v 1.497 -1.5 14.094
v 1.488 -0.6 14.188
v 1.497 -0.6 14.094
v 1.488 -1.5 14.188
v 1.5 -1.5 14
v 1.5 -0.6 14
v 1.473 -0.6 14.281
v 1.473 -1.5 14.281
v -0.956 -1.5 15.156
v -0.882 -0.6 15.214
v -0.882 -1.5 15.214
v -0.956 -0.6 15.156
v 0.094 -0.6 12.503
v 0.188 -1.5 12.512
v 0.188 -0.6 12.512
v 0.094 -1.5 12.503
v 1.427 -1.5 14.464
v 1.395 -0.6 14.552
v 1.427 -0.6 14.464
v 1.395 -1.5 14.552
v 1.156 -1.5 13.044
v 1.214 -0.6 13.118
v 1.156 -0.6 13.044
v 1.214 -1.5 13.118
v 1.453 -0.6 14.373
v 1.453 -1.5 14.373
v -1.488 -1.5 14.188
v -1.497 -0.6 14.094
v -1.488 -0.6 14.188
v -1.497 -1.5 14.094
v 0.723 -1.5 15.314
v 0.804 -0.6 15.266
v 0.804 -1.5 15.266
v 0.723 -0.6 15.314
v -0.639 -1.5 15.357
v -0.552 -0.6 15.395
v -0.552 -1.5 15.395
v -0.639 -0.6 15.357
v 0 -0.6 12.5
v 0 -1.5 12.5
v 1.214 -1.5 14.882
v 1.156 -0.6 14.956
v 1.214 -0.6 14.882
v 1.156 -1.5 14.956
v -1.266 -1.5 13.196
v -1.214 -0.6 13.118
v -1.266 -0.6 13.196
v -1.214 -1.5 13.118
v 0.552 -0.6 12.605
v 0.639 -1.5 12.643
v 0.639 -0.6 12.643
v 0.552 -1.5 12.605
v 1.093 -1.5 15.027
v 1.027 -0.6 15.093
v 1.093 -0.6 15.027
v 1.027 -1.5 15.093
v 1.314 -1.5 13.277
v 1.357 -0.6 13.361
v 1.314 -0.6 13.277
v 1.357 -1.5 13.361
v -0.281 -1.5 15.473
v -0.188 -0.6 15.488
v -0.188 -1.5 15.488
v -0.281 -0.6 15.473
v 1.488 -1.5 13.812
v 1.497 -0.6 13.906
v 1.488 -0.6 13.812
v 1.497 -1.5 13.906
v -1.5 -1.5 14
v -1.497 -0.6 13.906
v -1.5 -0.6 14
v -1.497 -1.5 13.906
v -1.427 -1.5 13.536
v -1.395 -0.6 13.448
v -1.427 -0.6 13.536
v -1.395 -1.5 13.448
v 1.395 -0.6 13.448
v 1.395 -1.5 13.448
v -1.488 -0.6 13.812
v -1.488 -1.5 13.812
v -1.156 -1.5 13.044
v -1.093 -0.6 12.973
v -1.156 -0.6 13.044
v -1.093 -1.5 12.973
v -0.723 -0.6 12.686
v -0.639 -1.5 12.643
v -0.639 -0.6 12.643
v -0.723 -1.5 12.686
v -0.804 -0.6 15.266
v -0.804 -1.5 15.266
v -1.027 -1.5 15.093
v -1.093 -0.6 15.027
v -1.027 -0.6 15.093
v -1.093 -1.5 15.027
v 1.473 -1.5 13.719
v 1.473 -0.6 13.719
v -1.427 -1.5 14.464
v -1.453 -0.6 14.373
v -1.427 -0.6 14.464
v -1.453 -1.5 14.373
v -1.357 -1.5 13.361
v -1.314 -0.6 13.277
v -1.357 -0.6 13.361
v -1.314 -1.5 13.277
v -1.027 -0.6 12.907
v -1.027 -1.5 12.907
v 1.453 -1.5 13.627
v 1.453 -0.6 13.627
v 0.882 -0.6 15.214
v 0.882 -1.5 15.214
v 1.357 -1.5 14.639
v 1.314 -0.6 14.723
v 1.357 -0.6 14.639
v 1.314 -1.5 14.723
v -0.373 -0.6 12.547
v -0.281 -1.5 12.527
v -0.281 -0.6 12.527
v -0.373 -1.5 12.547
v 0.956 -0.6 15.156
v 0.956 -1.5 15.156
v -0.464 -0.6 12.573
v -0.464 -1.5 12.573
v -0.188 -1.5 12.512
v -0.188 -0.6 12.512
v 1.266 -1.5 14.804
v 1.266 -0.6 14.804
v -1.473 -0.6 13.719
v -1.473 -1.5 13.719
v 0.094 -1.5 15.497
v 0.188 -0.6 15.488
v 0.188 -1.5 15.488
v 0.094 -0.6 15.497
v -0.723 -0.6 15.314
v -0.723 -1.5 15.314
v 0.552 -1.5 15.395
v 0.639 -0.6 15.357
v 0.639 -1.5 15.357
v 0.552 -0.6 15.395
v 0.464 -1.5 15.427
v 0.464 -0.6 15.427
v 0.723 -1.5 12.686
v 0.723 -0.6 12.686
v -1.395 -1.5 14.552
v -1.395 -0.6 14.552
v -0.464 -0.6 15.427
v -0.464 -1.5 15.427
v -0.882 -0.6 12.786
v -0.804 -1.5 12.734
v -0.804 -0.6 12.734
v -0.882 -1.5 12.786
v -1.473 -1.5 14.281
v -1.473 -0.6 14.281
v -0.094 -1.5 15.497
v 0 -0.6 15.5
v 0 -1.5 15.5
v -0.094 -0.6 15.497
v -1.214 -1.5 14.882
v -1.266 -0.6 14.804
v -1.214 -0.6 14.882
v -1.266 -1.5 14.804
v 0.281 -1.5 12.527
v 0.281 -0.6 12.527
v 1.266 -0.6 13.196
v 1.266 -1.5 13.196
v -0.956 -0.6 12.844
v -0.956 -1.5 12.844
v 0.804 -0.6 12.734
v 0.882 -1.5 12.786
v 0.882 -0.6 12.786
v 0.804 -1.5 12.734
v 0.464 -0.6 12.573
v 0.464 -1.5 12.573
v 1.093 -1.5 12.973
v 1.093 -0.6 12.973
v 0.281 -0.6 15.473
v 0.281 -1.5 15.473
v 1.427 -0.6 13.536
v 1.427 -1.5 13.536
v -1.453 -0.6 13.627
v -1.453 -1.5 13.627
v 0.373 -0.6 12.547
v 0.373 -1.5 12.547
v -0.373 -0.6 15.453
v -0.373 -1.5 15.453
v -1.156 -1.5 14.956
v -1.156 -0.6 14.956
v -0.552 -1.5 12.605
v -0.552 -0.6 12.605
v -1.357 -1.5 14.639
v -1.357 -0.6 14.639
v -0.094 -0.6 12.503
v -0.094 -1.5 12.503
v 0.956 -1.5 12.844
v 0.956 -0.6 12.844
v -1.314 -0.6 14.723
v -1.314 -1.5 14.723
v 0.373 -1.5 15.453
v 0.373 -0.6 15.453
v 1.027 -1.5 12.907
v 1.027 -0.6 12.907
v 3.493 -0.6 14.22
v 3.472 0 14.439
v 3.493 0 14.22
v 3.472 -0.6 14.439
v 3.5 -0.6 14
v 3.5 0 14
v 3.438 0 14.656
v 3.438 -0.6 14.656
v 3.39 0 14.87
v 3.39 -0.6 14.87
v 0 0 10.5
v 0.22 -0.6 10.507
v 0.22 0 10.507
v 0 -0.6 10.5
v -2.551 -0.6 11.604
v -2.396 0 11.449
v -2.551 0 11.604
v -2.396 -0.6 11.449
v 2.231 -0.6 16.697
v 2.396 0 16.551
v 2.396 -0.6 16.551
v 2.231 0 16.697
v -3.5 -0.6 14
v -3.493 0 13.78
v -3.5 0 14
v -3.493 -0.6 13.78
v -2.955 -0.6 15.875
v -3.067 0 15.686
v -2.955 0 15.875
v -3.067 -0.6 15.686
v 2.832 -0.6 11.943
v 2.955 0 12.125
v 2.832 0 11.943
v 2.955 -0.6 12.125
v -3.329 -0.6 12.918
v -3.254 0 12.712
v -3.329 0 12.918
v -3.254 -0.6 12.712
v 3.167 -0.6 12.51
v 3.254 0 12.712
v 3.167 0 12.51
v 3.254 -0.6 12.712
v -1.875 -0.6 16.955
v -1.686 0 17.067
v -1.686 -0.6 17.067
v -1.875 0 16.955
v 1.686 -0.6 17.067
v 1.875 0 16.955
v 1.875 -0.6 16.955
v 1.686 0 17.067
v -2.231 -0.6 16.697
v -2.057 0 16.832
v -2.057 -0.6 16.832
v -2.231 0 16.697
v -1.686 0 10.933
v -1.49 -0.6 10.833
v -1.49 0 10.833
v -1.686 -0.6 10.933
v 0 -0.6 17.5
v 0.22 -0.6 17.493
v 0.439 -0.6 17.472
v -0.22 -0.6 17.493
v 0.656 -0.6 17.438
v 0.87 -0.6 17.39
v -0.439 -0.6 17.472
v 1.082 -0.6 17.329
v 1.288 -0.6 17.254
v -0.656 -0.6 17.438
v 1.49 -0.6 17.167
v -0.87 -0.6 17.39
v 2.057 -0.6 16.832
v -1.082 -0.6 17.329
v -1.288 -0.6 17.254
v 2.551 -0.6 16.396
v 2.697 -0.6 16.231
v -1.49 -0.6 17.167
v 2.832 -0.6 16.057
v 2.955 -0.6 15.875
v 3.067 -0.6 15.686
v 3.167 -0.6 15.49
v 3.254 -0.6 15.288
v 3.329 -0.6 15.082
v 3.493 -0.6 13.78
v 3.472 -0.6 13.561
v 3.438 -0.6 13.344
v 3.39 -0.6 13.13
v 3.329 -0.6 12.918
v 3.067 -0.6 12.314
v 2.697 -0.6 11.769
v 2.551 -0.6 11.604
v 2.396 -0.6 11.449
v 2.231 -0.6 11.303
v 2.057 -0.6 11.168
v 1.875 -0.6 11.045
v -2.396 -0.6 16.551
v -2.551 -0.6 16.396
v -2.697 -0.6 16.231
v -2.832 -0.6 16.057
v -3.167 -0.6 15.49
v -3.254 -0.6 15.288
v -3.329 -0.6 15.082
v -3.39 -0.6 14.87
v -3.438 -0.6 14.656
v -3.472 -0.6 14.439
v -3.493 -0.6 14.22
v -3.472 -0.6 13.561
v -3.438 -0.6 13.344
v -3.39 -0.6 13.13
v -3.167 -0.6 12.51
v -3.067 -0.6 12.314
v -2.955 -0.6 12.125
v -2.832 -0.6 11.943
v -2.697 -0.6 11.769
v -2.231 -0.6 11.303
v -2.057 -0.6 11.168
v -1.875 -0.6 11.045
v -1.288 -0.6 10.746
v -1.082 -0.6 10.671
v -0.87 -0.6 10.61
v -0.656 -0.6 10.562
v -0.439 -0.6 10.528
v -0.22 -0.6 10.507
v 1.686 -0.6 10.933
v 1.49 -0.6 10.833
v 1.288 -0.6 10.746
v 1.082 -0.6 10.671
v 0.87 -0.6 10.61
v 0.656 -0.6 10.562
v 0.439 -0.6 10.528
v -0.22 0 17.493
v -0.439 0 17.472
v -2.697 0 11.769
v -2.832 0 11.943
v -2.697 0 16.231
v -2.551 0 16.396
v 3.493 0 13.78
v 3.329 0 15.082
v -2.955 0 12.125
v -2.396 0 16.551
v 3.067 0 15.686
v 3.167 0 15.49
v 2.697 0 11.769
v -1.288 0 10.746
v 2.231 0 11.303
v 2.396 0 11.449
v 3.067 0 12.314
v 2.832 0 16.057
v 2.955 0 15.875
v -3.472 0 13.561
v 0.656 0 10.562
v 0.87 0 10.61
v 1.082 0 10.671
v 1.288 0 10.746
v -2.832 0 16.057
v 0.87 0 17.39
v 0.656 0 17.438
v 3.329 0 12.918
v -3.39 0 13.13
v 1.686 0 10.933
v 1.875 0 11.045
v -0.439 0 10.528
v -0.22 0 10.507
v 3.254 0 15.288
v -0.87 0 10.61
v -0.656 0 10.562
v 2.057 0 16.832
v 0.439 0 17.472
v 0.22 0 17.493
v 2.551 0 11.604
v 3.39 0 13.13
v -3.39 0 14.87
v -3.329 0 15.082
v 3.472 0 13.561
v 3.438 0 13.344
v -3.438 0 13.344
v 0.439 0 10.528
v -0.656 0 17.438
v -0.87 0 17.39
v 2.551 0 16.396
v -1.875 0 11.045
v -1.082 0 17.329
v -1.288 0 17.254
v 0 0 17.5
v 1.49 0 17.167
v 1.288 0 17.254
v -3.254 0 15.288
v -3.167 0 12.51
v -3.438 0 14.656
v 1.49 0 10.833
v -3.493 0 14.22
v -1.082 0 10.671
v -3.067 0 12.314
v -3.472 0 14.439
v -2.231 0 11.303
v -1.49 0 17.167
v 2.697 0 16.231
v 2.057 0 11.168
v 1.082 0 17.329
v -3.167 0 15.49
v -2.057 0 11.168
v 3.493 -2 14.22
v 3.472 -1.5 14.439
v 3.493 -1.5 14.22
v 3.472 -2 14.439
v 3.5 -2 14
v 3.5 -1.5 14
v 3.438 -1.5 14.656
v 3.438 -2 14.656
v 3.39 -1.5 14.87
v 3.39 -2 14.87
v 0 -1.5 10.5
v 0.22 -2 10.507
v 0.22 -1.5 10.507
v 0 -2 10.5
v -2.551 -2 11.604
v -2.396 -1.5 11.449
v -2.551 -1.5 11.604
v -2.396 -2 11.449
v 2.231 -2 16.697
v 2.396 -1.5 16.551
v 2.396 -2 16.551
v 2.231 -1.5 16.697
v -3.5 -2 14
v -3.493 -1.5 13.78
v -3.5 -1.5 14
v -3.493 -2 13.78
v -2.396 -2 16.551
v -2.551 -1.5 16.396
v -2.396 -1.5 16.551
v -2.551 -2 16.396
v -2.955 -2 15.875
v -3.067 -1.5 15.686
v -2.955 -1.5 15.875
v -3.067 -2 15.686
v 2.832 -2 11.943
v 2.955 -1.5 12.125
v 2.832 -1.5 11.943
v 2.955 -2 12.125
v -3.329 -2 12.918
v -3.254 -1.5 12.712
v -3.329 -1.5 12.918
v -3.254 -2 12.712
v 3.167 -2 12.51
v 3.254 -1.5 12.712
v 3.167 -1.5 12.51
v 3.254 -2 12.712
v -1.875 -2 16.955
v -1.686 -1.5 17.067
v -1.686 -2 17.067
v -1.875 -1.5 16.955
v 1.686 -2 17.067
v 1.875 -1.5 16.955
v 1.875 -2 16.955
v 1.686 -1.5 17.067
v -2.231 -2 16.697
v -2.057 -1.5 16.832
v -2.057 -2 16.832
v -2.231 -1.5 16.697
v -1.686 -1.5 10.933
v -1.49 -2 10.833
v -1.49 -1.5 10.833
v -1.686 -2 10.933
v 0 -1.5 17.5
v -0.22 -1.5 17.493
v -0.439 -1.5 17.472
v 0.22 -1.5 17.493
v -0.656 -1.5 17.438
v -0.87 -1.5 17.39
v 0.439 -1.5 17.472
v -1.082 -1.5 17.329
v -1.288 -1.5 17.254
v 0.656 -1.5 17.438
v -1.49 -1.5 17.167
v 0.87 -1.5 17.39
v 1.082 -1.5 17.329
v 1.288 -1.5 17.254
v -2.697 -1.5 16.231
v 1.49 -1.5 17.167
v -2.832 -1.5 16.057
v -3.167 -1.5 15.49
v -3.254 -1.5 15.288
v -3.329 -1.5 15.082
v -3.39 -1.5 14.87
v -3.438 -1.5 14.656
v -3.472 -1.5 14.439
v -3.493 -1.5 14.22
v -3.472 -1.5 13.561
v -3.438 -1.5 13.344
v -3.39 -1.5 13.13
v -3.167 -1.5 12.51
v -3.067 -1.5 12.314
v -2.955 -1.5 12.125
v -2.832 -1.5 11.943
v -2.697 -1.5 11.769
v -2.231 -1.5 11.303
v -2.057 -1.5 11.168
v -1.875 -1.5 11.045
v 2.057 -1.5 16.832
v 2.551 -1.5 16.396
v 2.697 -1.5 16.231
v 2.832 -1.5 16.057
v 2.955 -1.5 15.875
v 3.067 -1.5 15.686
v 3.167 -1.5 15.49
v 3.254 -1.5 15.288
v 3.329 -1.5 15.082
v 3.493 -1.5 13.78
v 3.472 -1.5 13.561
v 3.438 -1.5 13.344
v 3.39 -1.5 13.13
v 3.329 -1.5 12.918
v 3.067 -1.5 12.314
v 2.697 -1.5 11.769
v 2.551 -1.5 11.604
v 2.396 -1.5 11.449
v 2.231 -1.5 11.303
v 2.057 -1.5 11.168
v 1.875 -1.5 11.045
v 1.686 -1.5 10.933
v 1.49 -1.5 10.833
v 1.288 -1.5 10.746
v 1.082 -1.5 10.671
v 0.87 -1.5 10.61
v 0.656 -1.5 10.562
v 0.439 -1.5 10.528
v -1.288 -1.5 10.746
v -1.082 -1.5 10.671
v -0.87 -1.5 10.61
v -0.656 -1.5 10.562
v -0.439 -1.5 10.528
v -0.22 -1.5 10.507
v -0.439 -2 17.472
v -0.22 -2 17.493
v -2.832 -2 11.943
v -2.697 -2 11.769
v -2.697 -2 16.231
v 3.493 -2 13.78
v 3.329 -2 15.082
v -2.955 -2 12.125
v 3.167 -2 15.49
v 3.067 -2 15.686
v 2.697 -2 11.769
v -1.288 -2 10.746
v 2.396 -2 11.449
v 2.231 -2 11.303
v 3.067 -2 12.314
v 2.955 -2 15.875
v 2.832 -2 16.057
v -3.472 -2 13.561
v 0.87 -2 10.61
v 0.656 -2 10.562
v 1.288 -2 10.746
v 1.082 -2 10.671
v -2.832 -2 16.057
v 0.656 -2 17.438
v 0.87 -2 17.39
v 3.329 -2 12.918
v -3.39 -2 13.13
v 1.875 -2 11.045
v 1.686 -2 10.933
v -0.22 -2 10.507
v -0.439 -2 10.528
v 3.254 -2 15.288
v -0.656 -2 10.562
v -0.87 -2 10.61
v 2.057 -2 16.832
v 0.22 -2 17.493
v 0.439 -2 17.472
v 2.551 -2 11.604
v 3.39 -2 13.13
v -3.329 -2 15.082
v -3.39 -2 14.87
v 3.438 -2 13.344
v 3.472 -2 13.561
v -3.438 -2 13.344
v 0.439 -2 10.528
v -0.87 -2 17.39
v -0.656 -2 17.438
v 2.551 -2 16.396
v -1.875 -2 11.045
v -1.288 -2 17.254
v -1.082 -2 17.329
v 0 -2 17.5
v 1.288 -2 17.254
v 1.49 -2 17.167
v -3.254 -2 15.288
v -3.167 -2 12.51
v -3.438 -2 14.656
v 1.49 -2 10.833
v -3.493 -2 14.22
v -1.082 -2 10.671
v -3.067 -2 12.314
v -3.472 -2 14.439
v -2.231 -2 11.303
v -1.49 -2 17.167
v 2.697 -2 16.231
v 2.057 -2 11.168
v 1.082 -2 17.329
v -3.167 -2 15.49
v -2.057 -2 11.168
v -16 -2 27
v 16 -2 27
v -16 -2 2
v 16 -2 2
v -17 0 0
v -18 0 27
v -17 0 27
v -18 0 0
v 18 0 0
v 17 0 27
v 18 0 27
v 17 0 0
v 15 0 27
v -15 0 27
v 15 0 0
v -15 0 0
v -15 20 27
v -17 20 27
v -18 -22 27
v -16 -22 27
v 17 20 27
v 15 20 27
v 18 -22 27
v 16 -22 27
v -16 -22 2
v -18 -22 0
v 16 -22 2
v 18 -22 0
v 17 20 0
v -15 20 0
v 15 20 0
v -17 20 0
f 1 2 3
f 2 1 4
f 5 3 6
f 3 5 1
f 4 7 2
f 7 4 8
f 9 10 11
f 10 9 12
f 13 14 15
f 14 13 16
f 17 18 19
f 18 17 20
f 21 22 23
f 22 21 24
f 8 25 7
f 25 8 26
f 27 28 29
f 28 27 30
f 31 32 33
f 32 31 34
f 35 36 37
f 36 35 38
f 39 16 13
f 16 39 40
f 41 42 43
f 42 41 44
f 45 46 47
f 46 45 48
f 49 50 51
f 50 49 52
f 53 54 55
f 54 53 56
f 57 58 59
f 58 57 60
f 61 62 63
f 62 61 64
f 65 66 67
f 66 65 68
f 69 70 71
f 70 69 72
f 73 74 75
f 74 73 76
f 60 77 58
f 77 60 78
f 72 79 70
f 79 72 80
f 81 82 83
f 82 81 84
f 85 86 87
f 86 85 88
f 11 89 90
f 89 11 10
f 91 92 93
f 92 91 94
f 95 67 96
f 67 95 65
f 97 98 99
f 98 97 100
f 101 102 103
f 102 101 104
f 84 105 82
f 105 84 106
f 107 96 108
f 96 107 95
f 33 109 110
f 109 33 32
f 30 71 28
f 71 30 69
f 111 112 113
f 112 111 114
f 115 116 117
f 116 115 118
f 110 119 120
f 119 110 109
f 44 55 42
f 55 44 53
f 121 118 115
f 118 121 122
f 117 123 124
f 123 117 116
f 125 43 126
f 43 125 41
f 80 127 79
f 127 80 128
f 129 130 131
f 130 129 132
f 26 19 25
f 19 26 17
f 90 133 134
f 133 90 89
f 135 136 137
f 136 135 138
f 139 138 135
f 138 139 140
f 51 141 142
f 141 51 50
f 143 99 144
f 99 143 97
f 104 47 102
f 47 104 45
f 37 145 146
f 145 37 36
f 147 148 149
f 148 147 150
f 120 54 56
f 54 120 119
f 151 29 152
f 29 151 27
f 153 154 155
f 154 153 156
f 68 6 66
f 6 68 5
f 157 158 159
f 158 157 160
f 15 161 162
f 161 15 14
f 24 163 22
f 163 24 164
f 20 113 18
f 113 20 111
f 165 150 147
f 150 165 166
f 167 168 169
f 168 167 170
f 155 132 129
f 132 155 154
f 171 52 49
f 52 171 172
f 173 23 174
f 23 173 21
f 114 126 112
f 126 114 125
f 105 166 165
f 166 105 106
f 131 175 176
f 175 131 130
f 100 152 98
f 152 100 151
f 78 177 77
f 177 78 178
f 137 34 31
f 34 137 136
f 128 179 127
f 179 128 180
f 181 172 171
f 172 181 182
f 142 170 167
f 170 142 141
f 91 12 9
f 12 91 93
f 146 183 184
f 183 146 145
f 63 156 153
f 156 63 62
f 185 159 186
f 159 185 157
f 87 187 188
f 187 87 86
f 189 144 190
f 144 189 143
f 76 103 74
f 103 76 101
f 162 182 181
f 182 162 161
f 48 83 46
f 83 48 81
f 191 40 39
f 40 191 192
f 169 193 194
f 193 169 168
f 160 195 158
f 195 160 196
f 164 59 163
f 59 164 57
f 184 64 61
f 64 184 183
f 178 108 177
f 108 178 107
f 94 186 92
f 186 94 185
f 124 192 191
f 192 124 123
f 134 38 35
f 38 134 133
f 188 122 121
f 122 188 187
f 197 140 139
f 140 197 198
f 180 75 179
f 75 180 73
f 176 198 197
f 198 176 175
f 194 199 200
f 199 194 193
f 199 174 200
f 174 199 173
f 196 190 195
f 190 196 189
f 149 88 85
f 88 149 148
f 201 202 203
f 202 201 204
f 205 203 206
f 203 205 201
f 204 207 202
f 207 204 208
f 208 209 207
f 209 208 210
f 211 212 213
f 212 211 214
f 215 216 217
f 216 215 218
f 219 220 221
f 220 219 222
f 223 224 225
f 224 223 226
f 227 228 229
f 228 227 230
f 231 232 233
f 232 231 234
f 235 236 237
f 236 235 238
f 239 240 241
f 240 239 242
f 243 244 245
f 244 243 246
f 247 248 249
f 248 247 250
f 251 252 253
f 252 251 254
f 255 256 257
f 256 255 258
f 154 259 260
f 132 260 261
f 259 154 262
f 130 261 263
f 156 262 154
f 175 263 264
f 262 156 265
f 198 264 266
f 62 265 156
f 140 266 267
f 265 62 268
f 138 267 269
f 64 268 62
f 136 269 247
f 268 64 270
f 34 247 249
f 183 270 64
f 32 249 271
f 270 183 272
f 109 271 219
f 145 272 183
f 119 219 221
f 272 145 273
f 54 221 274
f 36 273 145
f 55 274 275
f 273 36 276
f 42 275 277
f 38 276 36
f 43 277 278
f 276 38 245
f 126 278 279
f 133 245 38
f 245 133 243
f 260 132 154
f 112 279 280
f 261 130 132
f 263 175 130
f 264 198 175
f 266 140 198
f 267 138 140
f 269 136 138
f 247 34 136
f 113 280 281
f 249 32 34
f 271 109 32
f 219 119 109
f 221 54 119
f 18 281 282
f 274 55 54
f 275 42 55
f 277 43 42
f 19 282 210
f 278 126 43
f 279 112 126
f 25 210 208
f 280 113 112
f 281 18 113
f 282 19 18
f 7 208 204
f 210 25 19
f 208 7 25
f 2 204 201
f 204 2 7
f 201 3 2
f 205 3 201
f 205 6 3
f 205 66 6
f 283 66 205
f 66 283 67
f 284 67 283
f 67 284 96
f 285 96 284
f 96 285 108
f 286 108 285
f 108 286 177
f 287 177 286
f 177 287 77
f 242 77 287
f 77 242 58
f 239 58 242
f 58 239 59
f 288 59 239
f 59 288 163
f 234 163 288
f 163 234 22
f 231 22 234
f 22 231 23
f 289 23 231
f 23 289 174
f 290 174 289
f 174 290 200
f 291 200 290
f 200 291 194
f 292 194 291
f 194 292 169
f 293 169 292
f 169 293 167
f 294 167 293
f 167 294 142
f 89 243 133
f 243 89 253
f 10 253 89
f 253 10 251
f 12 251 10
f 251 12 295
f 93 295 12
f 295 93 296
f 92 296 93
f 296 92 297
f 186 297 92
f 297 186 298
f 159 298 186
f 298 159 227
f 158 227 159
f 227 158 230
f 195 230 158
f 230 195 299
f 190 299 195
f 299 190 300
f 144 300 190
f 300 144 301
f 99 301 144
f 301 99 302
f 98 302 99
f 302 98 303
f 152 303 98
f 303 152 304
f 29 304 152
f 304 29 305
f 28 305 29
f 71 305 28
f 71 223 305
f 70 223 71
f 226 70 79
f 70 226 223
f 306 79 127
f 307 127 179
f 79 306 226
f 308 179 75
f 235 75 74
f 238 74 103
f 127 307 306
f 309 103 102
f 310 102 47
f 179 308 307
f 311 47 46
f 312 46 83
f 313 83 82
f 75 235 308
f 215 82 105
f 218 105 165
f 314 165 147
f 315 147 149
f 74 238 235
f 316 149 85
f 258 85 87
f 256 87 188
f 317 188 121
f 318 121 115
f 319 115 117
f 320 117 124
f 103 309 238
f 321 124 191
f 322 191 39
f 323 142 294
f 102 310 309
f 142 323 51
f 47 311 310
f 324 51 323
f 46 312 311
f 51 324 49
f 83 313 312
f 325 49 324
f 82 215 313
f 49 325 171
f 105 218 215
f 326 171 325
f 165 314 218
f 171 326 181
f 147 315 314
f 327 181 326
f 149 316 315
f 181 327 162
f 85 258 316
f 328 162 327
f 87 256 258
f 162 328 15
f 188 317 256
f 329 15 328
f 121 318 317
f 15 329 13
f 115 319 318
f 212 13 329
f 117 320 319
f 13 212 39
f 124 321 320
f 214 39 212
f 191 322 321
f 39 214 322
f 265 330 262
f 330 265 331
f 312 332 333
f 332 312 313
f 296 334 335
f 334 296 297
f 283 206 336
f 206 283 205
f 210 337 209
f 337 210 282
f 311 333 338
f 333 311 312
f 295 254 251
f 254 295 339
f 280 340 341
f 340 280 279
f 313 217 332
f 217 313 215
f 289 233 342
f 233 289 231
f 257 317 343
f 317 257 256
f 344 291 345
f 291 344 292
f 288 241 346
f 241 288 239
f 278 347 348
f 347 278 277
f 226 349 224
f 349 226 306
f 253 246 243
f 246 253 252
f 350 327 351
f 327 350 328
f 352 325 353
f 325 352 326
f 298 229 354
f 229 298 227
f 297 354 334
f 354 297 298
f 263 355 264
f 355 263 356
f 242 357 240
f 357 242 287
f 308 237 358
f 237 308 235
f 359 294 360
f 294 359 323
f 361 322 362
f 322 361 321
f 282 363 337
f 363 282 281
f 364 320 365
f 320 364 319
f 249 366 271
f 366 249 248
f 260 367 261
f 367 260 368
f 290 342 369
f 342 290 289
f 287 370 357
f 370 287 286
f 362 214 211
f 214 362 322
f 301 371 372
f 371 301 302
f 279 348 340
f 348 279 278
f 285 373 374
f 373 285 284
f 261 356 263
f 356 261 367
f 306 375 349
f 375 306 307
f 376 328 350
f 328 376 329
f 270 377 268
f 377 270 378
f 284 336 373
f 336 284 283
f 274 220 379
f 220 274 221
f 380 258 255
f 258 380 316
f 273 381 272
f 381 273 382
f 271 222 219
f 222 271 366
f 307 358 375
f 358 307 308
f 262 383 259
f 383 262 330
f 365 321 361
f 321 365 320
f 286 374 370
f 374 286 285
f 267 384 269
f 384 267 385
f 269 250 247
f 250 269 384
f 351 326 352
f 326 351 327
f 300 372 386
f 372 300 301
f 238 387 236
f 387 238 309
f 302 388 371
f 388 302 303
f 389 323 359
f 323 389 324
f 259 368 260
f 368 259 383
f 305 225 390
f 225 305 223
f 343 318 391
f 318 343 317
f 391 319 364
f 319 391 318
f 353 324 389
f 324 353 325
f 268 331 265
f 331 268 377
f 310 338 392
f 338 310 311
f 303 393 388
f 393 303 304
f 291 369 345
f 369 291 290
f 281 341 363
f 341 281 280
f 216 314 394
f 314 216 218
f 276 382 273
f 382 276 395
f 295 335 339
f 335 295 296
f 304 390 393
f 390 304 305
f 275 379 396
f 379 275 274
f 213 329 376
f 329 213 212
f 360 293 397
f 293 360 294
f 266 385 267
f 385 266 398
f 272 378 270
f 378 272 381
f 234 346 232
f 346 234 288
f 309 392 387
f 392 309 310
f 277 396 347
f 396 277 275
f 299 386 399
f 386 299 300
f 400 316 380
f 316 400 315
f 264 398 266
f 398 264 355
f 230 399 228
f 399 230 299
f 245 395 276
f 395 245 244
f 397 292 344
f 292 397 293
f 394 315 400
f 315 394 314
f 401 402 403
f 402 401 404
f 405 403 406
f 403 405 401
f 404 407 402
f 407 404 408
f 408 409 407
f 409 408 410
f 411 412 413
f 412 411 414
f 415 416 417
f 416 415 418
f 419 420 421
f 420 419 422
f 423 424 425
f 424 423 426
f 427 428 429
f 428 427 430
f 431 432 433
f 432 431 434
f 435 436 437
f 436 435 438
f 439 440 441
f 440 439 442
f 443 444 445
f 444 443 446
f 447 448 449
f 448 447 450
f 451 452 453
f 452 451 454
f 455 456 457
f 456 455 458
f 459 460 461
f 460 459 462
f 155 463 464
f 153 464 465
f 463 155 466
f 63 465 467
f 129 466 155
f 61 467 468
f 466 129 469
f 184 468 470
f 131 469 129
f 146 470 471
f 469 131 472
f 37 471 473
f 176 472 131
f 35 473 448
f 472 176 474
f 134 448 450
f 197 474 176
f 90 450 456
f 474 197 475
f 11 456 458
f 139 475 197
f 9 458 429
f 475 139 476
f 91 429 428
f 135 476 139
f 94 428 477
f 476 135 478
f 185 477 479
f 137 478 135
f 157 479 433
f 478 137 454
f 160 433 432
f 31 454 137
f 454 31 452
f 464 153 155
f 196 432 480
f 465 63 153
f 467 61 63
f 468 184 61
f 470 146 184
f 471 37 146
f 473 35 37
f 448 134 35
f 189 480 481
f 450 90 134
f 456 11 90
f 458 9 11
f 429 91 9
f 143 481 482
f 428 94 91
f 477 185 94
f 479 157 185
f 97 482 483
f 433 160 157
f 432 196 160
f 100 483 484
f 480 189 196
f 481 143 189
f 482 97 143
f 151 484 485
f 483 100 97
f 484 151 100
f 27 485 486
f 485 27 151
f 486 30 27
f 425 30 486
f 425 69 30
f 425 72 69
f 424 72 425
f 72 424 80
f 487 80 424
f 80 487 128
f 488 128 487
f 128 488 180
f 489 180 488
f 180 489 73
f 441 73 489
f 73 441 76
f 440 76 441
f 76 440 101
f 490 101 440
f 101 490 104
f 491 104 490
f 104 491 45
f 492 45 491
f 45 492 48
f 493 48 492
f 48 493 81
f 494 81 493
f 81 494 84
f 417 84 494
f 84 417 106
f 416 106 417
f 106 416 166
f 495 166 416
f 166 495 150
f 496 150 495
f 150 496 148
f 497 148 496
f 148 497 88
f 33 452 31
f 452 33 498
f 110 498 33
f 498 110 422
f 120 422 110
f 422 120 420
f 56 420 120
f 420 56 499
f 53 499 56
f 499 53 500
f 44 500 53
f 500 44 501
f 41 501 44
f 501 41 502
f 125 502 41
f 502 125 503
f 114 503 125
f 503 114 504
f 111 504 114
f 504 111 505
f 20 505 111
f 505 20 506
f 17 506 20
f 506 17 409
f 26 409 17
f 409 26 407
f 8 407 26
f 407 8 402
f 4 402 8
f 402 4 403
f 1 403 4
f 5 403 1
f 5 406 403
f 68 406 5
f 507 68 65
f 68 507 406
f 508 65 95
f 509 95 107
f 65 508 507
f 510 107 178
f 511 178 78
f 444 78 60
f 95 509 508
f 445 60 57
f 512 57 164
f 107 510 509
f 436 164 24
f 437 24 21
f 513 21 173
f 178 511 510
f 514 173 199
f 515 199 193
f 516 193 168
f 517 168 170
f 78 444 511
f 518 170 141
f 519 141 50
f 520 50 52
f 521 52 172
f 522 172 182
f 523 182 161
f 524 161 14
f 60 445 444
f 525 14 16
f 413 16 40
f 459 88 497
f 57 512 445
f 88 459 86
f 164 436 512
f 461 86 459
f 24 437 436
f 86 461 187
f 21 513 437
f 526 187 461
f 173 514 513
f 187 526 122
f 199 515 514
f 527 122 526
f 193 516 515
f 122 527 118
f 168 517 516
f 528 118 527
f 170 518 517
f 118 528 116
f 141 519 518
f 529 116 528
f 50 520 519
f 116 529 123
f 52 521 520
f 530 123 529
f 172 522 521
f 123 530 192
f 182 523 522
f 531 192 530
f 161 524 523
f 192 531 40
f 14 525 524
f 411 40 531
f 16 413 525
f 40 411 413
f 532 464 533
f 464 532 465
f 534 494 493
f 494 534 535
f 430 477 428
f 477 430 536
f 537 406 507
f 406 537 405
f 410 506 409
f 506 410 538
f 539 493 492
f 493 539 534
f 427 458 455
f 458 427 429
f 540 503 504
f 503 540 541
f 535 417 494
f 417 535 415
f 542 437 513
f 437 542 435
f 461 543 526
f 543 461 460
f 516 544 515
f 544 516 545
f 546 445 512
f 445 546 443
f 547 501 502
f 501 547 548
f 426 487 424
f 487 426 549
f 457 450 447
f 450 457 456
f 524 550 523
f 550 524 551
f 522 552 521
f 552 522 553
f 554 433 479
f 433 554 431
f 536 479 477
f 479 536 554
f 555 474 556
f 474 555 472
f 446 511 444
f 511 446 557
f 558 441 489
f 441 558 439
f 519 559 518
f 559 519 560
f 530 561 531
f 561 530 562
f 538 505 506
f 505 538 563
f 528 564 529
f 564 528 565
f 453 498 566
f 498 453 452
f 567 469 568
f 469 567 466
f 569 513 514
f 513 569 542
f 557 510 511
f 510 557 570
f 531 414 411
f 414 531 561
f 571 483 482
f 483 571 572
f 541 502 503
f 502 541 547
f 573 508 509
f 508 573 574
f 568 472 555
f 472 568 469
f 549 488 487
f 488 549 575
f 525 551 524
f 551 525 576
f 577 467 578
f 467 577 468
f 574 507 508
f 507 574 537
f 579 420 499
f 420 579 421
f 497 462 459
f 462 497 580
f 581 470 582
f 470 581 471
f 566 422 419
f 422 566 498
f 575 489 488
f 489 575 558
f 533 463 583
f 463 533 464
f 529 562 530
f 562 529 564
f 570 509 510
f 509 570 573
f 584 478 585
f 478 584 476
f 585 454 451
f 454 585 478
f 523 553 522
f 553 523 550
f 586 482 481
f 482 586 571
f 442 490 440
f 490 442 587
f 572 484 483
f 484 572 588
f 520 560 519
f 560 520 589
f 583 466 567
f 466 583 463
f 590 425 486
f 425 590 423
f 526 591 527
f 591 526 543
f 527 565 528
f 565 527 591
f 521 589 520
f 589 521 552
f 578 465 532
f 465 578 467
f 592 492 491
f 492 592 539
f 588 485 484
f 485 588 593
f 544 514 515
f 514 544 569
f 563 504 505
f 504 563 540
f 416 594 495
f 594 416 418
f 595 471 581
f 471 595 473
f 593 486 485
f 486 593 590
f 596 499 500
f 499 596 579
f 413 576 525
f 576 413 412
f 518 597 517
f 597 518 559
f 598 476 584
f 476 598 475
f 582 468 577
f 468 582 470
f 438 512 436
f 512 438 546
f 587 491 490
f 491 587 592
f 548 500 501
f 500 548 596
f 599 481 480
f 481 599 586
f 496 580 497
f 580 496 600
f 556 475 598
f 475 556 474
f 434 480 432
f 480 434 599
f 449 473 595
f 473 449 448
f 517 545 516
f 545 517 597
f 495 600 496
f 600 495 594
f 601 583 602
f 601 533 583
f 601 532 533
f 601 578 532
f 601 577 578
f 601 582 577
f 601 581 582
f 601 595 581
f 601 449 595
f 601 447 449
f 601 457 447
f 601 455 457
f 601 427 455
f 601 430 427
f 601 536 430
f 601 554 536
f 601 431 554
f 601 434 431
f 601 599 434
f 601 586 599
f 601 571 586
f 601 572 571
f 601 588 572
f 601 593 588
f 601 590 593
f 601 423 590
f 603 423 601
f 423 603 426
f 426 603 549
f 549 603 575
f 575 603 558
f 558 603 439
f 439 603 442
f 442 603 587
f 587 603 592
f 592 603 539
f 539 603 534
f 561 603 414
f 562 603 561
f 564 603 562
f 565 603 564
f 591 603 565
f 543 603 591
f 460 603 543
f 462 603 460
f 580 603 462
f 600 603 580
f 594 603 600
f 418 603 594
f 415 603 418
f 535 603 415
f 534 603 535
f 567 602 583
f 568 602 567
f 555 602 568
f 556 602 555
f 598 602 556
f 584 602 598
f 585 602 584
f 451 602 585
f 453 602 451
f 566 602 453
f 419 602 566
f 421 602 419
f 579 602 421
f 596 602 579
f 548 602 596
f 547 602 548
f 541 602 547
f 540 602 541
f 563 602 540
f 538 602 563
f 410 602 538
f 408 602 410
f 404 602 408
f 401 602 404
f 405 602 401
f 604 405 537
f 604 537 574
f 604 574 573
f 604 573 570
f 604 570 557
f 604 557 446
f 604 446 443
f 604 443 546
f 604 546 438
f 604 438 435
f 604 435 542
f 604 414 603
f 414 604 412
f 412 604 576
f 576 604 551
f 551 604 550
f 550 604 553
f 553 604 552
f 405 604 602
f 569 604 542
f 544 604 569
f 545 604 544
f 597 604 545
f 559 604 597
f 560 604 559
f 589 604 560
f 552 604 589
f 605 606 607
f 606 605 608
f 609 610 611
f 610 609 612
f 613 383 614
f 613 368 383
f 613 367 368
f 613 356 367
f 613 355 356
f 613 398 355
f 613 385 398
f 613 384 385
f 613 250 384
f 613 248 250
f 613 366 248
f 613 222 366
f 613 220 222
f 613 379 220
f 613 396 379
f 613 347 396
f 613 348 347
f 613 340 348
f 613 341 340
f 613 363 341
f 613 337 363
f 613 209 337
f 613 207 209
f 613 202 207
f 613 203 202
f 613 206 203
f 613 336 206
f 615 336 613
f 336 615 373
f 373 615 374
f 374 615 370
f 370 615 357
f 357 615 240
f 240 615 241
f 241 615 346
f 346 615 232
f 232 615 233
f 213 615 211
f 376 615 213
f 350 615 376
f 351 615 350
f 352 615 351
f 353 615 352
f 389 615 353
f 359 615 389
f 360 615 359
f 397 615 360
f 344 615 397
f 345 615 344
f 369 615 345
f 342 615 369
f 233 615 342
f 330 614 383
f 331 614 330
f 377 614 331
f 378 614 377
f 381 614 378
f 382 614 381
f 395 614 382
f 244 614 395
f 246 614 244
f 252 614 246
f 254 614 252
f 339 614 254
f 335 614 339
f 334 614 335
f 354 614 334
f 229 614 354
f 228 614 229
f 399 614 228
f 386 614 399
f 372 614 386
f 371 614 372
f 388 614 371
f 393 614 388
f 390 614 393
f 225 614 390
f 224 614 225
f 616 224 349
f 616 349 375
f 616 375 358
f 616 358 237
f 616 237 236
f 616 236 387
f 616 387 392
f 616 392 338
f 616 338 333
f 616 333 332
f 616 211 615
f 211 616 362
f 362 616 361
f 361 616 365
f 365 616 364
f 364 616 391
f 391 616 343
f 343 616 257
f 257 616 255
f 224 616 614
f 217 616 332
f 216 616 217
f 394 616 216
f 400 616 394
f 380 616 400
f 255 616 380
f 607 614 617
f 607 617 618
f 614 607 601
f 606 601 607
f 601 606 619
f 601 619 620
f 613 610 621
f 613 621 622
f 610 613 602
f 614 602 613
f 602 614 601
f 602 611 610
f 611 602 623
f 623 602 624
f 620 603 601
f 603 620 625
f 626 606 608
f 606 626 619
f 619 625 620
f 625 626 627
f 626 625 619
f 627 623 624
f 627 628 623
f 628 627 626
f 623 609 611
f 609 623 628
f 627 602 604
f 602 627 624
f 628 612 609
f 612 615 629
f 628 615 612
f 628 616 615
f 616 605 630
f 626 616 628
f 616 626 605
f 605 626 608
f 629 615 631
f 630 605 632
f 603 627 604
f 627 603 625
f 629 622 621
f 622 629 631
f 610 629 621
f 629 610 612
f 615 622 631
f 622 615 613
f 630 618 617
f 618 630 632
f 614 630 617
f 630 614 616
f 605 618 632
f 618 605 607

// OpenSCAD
// file: common.scad
// This work is licensed under a Creative Commons Attribution-ShareAlike 4.0 International License (http://creativecommons.org/licenses/by-sa/4.0/)

module xmove(dist) { translate([dist, 0, 0]) children(); }
module ymove(dist) { translate([0, dist, 0]) children(); }
module zmove(dist) { translate([0, 0, dist]) children(); }
module xrot(angle) { rotate([angle, 0, 0]) children(); }
module yrot(angle) { rotate([0, angle, 0]) children(); }
module zrot(angle) { rotate([0, 0, angle]) children(); }

module round_cube(dimensions, radius, center=false) {
    if (center) {
        translate([0, 0, -0.5]) _round_cube(dimensions, radius, center);
    } else {
        translate([radius, radius, 0]) _round_cube(dimensions, radius);
    }
}

module _round_cube(dimensions, radius, center=false) {
        minkowski() {
            cube([dimensions[0] - radius*2, dimensions[1] - radius*2, dimensions[2] - 1], center=center);
            cylinder(r=radius,h=1);
        }
}


module hollow_cylinder_thick(height, outer_radius, thickness) {
    difference() {
        cylinder(h=height, r=outer_radius, center=true);
        cylinder(h=height + 0.02, r=outer_radius - thickness, center=true);
    }
}

module hollow_cylinder(height, externalDiameter, internalDiameter) {
    difference() {
        cylinder(height, r=externalDiameter/2);
        translate([0, 0, -1]) cylinder(height + 2, r=internalDiameter/2);
    }
}

module screw_hole(screwDiameter, headDiameter, depth, headDepth) {    
    translate([0, 0, -depth]) cylinder(h=4 * depth, r=screwDiameter / 2);
    translate([0, 0, depth - headDepth]) cylinder(h=4 * depth, r=headDiameter / 2);
}

module cylinder_sector(diameter, startAngle, endAngle) {
    cylinder(h=height, d=diameter);
}


$fn=100;
size=10;
distance=0;

round_cube(dimensions=[10,10,3], radius=3);
!round_cube(dimensions=[10,10,3], radius=3, center=true);
hollow_cylinder(height=3, externalDiameter=10, internalDiameter=7);
difference() { cube([10, 10, 3]); translate([5, 5, 0]) screw_hole(screwDiameter=3, headDiameter=6, depth=3, headDepth=1); }
cylinder_sector(height=3, diameter=10, startAngle=0, endAngle=180);
// main file
// This work is licensed under a Creative Commons Attribution-ShareAlike 4.0 International License (http://creativecommons.org/licenses/by-sa/4.0/)

use <common.scad>;

$fn=100;
rxd = 20;
lxd = 20;

zd = 25; // height

ryd = 30;
lyd = 32;
yd = max(lyd, ryd);

thikness = 2;
screw = 3;

module cube_hole(dimensions, diameter) {
    difference() {
        cube(dimensions);
        
        translate([dimensions[0] / 2, dimensions[1] / 2, 0]) 
        translate([0, 0, dimensions[2]]) mirror([0, 0, 1]) screw_hole(screw, screw + 4, dimensions[2], 0.6);
        
        translate([dimensions[0] / 2, dimensions[1] / 2, 0]) screw_hole(screw, screw + 4, dimensions[2], 0.5);
    }
}

e=1;

translate([0, 0, thikness]) rotate([90, 0, 0]) union() {

// divider
translate([-e - yd/2, -e, 0]) cube_hole([yd + 2*e, zd + 1*e, thikness]);

// left part: support
translate([-lyd/2, 0, 0]) union() {
    translate([-thikness, -e, lxd + thikness]) rotate([0, 90, 0]) cube([lxd + thikness, zd + e, thikness]);
    translate([lyd, -e, lxd + thikness]) rotate([0, 90, 0]) cube([lxd + thikness, zd + e, thikness]);
    translate([-thikness, 0, 0]) rotate([90, 0, 0]) cube([lyd + 2 * thikness, lxd + thikness, thikness]);
}

// right part
translate([-ryd/2, 0, 0]) union() {
    translate([ryd, -thikness, e]) rotate([0, 90, 0]) cube([rxd + e, zd + thikness, thikness]);
    translate([-thikness, -thikness, e]) rotate([0, 90, 0]) cube([rxd + e, zd + thikness, thikness]);
}

}
